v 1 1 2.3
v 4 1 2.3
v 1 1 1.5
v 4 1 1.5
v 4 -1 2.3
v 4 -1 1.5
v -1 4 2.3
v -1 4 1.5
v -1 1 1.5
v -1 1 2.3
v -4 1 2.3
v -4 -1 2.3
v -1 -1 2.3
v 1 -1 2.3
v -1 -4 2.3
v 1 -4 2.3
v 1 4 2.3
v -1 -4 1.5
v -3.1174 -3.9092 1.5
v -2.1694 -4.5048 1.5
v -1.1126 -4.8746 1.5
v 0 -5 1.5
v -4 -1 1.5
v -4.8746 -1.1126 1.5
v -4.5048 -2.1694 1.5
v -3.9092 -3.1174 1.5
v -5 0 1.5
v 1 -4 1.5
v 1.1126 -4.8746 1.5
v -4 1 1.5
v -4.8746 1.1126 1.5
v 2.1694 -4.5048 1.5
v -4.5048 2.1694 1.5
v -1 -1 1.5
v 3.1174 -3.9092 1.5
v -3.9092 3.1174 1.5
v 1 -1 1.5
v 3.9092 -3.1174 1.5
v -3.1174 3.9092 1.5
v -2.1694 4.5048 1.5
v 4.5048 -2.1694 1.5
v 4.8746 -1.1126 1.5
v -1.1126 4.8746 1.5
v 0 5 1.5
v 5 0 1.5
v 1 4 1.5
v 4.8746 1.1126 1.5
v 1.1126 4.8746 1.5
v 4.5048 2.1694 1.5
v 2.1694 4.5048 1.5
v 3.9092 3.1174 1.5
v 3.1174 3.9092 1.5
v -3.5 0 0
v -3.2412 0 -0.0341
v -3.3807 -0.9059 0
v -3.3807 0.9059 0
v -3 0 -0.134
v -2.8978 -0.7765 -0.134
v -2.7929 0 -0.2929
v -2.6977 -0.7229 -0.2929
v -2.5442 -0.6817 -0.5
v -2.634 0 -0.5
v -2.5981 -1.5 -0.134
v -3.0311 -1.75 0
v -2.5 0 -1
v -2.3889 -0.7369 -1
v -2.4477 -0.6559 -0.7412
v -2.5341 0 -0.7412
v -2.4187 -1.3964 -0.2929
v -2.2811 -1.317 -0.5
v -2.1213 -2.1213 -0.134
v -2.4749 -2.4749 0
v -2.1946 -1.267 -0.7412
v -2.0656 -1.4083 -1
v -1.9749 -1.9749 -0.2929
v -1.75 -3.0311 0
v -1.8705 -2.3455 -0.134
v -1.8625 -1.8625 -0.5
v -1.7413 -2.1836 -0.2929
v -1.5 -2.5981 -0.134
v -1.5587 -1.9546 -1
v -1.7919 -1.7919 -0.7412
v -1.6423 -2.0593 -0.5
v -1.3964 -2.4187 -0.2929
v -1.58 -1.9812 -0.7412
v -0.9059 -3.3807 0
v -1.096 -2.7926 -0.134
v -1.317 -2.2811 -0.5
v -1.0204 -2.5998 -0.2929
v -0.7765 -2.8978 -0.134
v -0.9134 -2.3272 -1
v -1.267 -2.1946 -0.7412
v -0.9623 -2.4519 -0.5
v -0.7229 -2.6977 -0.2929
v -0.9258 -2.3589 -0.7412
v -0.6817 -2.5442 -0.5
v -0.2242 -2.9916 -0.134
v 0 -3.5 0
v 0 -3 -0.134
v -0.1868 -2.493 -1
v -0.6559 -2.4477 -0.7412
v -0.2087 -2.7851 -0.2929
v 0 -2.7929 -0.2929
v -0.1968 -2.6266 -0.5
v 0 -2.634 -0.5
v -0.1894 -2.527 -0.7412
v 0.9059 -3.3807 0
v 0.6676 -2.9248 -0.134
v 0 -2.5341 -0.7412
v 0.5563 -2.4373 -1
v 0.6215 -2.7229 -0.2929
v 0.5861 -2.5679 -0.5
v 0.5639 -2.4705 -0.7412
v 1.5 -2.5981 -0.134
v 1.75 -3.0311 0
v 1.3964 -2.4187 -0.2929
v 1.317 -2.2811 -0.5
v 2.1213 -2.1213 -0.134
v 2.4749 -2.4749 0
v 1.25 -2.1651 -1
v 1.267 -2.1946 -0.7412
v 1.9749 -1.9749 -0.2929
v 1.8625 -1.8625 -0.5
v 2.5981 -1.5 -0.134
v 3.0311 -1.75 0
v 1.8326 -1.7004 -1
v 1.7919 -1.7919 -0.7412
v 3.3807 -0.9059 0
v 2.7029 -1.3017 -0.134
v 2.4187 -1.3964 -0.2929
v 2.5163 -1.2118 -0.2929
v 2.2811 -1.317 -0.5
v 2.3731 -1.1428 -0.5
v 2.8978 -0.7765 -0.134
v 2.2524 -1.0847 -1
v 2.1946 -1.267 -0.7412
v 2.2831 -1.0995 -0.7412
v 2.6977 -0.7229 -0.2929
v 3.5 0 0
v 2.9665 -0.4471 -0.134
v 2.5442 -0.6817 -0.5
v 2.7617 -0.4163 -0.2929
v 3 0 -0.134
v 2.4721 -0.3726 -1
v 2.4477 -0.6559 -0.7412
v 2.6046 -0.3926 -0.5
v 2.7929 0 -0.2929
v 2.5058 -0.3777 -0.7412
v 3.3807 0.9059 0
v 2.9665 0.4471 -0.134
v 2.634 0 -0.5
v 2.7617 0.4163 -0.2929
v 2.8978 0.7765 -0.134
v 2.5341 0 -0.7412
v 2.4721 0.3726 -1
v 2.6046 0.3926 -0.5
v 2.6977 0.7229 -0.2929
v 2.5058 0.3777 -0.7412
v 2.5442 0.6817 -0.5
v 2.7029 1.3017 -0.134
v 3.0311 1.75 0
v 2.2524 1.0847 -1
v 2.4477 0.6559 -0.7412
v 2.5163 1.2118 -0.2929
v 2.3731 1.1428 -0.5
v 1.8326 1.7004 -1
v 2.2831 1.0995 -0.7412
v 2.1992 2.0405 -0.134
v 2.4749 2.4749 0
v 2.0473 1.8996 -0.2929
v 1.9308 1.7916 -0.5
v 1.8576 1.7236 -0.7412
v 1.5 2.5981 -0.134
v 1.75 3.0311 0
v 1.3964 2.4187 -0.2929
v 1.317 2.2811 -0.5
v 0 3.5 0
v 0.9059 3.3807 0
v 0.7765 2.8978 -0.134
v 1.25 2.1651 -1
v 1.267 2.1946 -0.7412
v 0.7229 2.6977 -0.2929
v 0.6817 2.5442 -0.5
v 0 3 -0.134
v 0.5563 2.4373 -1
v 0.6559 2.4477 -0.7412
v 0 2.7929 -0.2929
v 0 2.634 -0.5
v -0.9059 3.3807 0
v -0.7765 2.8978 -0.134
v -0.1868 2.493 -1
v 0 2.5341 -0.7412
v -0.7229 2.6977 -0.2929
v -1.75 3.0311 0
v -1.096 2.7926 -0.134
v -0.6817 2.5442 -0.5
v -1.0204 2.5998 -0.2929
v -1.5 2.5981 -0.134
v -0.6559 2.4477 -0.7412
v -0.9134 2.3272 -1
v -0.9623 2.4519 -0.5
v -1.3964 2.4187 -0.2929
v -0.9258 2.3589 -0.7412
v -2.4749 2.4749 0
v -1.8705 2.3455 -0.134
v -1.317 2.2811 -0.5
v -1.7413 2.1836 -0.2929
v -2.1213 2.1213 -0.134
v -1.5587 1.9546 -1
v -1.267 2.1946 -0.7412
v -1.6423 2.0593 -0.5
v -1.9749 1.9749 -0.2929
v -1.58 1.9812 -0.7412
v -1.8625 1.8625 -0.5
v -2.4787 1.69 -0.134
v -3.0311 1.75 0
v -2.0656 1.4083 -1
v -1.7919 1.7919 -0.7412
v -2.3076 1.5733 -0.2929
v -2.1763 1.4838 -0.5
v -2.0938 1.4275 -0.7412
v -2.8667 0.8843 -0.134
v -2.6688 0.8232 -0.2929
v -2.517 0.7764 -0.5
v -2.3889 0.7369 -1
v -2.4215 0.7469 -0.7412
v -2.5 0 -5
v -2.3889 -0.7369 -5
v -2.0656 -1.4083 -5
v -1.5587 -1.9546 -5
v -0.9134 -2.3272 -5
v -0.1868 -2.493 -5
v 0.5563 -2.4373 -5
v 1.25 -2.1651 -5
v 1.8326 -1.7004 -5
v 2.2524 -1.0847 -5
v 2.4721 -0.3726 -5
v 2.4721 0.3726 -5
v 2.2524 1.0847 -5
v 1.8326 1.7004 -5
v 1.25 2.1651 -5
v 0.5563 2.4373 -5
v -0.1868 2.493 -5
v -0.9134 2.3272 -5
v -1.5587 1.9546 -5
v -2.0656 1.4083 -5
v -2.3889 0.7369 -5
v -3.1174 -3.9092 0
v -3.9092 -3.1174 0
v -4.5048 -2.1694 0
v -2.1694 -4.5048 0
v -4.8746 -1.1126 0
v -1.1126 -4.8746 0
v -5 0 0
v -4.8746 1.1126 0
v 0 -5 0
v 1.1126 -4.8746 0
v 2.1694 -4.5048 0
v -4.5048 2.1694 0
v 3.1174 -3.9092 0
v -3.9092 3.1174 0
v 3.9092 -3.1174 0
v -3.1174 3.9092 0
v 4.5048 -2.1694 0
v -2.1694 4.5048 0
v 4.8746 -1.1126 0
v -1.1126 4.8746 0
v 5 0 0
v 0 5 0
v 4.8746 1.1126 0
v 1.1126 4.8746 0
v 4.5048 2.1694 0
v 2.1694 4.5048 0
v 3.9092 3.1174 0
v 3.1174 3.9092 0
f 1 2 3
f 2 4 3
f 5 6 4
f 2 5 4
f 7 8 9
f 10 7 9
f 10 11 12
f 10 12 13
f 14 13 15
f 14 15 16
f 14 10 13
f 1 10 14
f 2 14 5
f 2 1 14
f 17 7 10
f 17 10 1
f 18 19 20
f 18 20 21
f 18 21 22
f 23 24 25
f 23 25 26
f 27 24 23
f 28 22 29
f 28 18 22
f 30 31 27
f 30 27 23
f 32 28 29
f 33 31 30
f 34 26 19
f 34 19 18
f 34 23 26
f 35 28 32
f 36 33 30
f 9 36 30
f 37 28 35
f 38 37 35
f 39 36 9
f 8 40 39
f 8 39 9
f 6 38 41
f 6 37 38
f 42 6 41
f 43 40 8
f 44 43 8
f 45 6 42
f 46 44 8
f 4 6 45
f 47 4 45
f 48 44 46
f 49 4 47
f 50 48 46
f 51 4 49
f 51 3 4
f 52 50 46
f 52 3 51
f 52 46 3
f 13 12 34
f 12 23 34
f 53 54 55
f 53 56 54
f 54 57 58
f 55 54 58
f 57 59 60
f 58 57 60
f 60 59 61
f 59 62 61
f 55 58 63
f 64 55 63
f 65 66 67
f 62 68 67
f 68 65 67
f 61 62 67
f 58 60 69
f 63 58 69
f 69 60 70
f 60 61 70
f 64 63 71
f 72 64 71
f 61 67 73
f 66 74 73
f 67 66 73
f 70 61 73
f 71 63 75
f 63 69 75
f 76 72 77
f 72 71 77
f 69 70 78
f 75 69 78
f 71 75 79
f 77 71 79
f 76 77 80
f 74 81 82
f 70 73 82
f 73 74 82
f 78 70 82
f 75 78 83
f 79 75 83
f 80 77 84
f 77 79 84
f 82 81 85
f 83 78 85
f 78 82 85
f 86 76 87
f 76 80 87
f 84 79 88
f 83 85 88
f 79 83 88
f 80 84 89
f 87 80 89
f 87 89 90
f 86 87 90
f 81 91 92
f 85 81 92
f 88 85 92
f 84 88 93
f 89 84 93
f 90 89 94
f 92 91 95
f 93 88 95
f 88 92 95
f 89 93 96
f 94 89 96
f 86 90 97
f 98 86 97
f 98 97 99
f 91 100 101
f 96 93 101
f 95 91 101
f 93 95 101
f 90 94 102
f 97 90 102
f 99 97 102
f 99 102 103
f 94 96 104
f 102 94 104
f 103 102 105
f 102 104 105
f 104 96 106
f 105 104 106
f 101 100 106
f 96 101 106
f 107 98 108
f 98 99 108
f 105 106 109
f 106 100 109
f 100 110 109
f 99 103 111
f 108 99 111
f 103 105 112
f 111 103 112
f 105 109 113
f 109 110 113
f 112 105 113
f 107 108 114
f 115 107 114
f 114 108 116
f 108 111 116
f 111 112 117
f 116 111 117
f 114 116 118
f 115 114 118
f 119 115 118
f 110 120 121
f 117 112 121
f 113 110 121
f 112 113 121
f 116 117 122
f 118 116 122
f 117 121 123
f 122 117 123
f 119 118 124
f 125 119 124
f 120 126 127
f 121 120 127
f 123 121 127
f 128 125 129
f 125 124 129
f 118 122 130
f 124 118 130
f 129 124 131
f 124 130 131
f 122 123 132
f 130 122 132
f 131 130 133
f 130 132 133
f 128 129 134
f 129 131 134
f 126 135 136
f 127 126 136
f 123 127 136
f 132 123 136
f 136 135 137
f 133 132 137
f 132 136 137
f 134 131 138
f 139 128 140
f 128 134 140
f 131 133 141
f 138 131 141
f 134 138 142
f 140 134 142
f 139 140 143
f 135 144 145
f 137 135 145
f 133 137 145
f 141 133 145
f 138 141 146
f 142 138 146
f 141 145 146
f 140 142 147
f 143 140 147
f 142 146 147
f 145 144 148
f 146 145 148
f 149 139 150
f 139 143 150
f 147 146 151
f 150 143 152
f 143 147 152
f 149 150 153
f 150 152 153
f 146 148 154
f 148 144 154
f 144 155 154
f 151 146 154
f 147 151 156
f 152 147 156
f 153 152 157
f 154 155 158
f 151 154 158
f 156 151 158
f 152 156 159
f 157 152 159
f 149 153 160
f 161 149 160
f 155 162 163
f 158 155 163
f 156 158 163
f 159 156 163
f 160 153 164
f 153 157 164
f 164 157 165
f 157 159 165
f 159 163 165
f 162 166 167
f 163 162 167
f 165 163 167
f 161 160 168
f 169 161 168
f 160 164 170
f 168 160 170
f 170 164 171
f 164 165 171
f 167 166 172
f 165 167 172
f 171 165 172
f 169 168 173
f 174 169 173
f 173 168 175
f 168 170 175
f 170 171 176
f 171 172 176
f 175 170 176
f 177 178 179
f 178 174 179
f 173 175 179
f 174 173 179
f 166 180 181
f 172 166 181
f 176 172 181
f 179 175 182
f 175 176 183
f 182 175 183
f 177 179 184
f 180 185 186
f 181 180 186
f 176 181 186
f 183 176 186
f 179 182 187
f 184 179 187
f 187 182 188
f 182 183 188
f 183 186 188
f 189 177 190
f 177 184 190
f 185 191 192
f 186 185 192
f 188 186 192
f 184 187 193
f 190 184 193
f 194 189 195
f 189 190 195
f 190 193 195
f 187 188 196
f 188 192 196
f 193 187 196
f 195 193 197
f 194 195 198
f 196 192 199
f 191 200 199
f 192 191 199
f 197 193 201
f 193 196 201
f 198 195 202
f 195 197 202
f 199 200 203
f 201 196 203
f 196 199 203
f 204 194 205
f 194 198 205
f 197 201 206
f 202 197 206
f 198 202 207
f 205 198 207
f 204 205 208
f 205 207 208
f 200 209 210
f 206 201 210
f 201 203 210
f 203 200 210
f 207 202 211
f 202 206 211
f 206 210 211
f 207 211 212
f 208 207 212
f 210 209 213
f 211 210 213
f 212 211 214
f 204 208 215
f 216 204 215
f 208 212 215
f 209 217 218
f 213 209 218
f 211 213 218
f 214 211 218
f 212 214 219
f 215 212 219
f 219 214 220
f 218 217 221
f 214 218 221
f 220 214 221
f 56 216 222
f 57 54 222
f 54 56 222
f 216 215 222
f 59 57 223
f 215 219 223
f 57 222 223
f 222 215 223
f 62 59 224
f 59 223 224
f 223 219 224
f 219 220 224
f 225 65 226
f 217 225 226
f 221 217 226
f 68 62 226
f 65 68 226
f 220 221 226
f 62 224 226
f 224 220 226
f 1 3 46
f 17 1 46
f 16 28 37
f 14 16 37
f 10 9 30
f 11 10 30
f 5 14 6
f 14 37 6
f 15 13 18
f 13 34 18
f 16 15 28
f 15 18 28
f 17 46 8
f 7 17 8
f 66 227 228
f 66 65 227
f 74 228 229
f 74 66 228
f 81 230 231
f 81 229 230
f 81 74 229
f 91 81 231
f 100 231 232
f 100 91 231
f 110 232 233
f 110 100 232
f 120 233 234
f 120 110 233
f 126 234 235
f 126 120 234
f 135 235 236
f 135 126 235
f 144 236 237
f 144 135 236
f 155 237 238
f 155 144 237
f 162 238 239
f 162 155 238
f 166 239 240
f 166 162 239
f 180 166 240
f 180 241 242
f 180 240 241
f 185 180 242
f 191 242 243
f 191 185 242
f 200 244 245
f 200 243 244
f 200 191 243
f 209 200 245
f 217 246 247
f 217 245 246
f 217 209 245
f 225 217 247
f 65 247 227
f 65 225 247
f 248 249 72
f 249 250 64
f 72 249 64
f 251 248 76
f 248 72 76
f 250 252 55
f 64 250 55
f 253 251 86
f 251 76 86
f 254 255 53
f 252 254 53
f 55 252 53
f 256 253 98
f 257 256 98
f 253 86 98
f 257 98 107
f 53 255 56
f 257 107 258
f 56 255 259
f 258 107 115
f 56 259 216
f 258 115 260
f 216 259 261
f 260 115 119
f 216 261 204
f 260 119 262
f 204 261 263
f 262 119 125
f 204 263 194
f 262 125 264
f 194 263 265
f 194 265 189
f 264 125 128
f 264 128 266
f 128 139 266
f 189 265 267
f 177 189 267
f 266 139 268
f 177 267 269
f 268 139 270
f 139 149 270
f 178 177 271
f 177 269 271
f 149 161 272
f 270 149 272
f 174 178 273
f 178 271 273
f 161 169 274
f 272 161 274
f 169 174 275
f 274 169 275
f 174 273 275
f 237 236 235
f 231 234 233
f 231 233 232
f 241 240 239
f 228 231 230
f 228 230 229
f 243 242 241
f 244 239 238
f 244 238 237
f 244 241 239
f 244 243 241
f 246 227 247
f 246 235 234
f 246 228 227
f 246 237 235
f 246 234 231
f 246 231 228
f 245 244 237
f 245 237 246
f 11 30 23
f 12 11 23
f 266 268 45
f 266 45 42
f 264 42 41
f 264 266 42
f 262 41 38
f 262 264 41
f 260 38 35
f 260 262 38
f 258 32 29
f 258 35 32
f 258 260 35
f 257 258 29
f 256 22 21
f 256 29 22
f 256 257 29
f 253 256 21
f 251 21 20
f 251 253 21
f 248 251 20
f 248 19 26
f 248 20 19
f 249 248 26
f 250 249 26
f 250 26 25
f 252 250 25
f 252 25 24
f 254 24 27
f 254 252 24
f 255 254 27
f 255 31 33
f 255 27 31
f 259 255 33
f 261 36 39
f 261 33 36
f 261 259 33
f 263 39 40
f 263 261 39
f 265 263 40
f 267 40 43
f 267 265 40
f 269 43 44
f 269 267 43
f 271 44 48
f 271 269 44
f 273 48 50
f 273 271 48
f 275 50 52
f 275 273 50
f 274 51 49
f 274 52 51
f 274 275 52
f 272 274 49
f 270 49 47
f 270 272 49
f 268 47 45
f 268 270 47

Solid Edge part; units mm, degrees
sketch "Sketch1" plane through (0, 0, 0) normal (0, 0, 1) x (1, 0, 0)
  circle A0 centre (0, 0) radius 5
extrude "Protrusion1" add sketch "Sketch1" along normal blind 1.5
sketch "Sketch2" plane through (0, 0, 0) normal (0, 0, 1) x (1, 0, 0)
  line L0 (-1, 4) -> (-1, -4)
  line L1 (-1, -4) -> (1, -4)
  line L2 (1, -4) -> (1, 4)
  line L3 (1, 4) -> (-1, 4)
extrude "Protrusão_Extrudada_2" add sketch "Sketch2" along normal blind 2.3
sketch "Sketch3" plane through (0, 0, 0) normal (0, 0, 1) x (1, 0, 0)
  line L0 (-4, -1) -> (4, -1)
  line L1 (4, -1) -> (4, 1)
  line L2 (4, 1) -> (-4, 1)
  line L3 (-4, 1) -> (-4, -1)
extrude "Protrusão_Extrudada_3" add sketch "Sketch3" along normal blind 2.3
sketch "Sketch4" plane through (0, 0, 0) normal (0, 0, -1) x (-1, 0, 0)
  circle A0 centre (0, 0) radius 2.5
extrude "Protrusão_Extrudada_5" add sketch "Sketch4" along normal blind 5
fillet "Redondo_1" radius 1 1 edges at (2.5, 0, 0)
